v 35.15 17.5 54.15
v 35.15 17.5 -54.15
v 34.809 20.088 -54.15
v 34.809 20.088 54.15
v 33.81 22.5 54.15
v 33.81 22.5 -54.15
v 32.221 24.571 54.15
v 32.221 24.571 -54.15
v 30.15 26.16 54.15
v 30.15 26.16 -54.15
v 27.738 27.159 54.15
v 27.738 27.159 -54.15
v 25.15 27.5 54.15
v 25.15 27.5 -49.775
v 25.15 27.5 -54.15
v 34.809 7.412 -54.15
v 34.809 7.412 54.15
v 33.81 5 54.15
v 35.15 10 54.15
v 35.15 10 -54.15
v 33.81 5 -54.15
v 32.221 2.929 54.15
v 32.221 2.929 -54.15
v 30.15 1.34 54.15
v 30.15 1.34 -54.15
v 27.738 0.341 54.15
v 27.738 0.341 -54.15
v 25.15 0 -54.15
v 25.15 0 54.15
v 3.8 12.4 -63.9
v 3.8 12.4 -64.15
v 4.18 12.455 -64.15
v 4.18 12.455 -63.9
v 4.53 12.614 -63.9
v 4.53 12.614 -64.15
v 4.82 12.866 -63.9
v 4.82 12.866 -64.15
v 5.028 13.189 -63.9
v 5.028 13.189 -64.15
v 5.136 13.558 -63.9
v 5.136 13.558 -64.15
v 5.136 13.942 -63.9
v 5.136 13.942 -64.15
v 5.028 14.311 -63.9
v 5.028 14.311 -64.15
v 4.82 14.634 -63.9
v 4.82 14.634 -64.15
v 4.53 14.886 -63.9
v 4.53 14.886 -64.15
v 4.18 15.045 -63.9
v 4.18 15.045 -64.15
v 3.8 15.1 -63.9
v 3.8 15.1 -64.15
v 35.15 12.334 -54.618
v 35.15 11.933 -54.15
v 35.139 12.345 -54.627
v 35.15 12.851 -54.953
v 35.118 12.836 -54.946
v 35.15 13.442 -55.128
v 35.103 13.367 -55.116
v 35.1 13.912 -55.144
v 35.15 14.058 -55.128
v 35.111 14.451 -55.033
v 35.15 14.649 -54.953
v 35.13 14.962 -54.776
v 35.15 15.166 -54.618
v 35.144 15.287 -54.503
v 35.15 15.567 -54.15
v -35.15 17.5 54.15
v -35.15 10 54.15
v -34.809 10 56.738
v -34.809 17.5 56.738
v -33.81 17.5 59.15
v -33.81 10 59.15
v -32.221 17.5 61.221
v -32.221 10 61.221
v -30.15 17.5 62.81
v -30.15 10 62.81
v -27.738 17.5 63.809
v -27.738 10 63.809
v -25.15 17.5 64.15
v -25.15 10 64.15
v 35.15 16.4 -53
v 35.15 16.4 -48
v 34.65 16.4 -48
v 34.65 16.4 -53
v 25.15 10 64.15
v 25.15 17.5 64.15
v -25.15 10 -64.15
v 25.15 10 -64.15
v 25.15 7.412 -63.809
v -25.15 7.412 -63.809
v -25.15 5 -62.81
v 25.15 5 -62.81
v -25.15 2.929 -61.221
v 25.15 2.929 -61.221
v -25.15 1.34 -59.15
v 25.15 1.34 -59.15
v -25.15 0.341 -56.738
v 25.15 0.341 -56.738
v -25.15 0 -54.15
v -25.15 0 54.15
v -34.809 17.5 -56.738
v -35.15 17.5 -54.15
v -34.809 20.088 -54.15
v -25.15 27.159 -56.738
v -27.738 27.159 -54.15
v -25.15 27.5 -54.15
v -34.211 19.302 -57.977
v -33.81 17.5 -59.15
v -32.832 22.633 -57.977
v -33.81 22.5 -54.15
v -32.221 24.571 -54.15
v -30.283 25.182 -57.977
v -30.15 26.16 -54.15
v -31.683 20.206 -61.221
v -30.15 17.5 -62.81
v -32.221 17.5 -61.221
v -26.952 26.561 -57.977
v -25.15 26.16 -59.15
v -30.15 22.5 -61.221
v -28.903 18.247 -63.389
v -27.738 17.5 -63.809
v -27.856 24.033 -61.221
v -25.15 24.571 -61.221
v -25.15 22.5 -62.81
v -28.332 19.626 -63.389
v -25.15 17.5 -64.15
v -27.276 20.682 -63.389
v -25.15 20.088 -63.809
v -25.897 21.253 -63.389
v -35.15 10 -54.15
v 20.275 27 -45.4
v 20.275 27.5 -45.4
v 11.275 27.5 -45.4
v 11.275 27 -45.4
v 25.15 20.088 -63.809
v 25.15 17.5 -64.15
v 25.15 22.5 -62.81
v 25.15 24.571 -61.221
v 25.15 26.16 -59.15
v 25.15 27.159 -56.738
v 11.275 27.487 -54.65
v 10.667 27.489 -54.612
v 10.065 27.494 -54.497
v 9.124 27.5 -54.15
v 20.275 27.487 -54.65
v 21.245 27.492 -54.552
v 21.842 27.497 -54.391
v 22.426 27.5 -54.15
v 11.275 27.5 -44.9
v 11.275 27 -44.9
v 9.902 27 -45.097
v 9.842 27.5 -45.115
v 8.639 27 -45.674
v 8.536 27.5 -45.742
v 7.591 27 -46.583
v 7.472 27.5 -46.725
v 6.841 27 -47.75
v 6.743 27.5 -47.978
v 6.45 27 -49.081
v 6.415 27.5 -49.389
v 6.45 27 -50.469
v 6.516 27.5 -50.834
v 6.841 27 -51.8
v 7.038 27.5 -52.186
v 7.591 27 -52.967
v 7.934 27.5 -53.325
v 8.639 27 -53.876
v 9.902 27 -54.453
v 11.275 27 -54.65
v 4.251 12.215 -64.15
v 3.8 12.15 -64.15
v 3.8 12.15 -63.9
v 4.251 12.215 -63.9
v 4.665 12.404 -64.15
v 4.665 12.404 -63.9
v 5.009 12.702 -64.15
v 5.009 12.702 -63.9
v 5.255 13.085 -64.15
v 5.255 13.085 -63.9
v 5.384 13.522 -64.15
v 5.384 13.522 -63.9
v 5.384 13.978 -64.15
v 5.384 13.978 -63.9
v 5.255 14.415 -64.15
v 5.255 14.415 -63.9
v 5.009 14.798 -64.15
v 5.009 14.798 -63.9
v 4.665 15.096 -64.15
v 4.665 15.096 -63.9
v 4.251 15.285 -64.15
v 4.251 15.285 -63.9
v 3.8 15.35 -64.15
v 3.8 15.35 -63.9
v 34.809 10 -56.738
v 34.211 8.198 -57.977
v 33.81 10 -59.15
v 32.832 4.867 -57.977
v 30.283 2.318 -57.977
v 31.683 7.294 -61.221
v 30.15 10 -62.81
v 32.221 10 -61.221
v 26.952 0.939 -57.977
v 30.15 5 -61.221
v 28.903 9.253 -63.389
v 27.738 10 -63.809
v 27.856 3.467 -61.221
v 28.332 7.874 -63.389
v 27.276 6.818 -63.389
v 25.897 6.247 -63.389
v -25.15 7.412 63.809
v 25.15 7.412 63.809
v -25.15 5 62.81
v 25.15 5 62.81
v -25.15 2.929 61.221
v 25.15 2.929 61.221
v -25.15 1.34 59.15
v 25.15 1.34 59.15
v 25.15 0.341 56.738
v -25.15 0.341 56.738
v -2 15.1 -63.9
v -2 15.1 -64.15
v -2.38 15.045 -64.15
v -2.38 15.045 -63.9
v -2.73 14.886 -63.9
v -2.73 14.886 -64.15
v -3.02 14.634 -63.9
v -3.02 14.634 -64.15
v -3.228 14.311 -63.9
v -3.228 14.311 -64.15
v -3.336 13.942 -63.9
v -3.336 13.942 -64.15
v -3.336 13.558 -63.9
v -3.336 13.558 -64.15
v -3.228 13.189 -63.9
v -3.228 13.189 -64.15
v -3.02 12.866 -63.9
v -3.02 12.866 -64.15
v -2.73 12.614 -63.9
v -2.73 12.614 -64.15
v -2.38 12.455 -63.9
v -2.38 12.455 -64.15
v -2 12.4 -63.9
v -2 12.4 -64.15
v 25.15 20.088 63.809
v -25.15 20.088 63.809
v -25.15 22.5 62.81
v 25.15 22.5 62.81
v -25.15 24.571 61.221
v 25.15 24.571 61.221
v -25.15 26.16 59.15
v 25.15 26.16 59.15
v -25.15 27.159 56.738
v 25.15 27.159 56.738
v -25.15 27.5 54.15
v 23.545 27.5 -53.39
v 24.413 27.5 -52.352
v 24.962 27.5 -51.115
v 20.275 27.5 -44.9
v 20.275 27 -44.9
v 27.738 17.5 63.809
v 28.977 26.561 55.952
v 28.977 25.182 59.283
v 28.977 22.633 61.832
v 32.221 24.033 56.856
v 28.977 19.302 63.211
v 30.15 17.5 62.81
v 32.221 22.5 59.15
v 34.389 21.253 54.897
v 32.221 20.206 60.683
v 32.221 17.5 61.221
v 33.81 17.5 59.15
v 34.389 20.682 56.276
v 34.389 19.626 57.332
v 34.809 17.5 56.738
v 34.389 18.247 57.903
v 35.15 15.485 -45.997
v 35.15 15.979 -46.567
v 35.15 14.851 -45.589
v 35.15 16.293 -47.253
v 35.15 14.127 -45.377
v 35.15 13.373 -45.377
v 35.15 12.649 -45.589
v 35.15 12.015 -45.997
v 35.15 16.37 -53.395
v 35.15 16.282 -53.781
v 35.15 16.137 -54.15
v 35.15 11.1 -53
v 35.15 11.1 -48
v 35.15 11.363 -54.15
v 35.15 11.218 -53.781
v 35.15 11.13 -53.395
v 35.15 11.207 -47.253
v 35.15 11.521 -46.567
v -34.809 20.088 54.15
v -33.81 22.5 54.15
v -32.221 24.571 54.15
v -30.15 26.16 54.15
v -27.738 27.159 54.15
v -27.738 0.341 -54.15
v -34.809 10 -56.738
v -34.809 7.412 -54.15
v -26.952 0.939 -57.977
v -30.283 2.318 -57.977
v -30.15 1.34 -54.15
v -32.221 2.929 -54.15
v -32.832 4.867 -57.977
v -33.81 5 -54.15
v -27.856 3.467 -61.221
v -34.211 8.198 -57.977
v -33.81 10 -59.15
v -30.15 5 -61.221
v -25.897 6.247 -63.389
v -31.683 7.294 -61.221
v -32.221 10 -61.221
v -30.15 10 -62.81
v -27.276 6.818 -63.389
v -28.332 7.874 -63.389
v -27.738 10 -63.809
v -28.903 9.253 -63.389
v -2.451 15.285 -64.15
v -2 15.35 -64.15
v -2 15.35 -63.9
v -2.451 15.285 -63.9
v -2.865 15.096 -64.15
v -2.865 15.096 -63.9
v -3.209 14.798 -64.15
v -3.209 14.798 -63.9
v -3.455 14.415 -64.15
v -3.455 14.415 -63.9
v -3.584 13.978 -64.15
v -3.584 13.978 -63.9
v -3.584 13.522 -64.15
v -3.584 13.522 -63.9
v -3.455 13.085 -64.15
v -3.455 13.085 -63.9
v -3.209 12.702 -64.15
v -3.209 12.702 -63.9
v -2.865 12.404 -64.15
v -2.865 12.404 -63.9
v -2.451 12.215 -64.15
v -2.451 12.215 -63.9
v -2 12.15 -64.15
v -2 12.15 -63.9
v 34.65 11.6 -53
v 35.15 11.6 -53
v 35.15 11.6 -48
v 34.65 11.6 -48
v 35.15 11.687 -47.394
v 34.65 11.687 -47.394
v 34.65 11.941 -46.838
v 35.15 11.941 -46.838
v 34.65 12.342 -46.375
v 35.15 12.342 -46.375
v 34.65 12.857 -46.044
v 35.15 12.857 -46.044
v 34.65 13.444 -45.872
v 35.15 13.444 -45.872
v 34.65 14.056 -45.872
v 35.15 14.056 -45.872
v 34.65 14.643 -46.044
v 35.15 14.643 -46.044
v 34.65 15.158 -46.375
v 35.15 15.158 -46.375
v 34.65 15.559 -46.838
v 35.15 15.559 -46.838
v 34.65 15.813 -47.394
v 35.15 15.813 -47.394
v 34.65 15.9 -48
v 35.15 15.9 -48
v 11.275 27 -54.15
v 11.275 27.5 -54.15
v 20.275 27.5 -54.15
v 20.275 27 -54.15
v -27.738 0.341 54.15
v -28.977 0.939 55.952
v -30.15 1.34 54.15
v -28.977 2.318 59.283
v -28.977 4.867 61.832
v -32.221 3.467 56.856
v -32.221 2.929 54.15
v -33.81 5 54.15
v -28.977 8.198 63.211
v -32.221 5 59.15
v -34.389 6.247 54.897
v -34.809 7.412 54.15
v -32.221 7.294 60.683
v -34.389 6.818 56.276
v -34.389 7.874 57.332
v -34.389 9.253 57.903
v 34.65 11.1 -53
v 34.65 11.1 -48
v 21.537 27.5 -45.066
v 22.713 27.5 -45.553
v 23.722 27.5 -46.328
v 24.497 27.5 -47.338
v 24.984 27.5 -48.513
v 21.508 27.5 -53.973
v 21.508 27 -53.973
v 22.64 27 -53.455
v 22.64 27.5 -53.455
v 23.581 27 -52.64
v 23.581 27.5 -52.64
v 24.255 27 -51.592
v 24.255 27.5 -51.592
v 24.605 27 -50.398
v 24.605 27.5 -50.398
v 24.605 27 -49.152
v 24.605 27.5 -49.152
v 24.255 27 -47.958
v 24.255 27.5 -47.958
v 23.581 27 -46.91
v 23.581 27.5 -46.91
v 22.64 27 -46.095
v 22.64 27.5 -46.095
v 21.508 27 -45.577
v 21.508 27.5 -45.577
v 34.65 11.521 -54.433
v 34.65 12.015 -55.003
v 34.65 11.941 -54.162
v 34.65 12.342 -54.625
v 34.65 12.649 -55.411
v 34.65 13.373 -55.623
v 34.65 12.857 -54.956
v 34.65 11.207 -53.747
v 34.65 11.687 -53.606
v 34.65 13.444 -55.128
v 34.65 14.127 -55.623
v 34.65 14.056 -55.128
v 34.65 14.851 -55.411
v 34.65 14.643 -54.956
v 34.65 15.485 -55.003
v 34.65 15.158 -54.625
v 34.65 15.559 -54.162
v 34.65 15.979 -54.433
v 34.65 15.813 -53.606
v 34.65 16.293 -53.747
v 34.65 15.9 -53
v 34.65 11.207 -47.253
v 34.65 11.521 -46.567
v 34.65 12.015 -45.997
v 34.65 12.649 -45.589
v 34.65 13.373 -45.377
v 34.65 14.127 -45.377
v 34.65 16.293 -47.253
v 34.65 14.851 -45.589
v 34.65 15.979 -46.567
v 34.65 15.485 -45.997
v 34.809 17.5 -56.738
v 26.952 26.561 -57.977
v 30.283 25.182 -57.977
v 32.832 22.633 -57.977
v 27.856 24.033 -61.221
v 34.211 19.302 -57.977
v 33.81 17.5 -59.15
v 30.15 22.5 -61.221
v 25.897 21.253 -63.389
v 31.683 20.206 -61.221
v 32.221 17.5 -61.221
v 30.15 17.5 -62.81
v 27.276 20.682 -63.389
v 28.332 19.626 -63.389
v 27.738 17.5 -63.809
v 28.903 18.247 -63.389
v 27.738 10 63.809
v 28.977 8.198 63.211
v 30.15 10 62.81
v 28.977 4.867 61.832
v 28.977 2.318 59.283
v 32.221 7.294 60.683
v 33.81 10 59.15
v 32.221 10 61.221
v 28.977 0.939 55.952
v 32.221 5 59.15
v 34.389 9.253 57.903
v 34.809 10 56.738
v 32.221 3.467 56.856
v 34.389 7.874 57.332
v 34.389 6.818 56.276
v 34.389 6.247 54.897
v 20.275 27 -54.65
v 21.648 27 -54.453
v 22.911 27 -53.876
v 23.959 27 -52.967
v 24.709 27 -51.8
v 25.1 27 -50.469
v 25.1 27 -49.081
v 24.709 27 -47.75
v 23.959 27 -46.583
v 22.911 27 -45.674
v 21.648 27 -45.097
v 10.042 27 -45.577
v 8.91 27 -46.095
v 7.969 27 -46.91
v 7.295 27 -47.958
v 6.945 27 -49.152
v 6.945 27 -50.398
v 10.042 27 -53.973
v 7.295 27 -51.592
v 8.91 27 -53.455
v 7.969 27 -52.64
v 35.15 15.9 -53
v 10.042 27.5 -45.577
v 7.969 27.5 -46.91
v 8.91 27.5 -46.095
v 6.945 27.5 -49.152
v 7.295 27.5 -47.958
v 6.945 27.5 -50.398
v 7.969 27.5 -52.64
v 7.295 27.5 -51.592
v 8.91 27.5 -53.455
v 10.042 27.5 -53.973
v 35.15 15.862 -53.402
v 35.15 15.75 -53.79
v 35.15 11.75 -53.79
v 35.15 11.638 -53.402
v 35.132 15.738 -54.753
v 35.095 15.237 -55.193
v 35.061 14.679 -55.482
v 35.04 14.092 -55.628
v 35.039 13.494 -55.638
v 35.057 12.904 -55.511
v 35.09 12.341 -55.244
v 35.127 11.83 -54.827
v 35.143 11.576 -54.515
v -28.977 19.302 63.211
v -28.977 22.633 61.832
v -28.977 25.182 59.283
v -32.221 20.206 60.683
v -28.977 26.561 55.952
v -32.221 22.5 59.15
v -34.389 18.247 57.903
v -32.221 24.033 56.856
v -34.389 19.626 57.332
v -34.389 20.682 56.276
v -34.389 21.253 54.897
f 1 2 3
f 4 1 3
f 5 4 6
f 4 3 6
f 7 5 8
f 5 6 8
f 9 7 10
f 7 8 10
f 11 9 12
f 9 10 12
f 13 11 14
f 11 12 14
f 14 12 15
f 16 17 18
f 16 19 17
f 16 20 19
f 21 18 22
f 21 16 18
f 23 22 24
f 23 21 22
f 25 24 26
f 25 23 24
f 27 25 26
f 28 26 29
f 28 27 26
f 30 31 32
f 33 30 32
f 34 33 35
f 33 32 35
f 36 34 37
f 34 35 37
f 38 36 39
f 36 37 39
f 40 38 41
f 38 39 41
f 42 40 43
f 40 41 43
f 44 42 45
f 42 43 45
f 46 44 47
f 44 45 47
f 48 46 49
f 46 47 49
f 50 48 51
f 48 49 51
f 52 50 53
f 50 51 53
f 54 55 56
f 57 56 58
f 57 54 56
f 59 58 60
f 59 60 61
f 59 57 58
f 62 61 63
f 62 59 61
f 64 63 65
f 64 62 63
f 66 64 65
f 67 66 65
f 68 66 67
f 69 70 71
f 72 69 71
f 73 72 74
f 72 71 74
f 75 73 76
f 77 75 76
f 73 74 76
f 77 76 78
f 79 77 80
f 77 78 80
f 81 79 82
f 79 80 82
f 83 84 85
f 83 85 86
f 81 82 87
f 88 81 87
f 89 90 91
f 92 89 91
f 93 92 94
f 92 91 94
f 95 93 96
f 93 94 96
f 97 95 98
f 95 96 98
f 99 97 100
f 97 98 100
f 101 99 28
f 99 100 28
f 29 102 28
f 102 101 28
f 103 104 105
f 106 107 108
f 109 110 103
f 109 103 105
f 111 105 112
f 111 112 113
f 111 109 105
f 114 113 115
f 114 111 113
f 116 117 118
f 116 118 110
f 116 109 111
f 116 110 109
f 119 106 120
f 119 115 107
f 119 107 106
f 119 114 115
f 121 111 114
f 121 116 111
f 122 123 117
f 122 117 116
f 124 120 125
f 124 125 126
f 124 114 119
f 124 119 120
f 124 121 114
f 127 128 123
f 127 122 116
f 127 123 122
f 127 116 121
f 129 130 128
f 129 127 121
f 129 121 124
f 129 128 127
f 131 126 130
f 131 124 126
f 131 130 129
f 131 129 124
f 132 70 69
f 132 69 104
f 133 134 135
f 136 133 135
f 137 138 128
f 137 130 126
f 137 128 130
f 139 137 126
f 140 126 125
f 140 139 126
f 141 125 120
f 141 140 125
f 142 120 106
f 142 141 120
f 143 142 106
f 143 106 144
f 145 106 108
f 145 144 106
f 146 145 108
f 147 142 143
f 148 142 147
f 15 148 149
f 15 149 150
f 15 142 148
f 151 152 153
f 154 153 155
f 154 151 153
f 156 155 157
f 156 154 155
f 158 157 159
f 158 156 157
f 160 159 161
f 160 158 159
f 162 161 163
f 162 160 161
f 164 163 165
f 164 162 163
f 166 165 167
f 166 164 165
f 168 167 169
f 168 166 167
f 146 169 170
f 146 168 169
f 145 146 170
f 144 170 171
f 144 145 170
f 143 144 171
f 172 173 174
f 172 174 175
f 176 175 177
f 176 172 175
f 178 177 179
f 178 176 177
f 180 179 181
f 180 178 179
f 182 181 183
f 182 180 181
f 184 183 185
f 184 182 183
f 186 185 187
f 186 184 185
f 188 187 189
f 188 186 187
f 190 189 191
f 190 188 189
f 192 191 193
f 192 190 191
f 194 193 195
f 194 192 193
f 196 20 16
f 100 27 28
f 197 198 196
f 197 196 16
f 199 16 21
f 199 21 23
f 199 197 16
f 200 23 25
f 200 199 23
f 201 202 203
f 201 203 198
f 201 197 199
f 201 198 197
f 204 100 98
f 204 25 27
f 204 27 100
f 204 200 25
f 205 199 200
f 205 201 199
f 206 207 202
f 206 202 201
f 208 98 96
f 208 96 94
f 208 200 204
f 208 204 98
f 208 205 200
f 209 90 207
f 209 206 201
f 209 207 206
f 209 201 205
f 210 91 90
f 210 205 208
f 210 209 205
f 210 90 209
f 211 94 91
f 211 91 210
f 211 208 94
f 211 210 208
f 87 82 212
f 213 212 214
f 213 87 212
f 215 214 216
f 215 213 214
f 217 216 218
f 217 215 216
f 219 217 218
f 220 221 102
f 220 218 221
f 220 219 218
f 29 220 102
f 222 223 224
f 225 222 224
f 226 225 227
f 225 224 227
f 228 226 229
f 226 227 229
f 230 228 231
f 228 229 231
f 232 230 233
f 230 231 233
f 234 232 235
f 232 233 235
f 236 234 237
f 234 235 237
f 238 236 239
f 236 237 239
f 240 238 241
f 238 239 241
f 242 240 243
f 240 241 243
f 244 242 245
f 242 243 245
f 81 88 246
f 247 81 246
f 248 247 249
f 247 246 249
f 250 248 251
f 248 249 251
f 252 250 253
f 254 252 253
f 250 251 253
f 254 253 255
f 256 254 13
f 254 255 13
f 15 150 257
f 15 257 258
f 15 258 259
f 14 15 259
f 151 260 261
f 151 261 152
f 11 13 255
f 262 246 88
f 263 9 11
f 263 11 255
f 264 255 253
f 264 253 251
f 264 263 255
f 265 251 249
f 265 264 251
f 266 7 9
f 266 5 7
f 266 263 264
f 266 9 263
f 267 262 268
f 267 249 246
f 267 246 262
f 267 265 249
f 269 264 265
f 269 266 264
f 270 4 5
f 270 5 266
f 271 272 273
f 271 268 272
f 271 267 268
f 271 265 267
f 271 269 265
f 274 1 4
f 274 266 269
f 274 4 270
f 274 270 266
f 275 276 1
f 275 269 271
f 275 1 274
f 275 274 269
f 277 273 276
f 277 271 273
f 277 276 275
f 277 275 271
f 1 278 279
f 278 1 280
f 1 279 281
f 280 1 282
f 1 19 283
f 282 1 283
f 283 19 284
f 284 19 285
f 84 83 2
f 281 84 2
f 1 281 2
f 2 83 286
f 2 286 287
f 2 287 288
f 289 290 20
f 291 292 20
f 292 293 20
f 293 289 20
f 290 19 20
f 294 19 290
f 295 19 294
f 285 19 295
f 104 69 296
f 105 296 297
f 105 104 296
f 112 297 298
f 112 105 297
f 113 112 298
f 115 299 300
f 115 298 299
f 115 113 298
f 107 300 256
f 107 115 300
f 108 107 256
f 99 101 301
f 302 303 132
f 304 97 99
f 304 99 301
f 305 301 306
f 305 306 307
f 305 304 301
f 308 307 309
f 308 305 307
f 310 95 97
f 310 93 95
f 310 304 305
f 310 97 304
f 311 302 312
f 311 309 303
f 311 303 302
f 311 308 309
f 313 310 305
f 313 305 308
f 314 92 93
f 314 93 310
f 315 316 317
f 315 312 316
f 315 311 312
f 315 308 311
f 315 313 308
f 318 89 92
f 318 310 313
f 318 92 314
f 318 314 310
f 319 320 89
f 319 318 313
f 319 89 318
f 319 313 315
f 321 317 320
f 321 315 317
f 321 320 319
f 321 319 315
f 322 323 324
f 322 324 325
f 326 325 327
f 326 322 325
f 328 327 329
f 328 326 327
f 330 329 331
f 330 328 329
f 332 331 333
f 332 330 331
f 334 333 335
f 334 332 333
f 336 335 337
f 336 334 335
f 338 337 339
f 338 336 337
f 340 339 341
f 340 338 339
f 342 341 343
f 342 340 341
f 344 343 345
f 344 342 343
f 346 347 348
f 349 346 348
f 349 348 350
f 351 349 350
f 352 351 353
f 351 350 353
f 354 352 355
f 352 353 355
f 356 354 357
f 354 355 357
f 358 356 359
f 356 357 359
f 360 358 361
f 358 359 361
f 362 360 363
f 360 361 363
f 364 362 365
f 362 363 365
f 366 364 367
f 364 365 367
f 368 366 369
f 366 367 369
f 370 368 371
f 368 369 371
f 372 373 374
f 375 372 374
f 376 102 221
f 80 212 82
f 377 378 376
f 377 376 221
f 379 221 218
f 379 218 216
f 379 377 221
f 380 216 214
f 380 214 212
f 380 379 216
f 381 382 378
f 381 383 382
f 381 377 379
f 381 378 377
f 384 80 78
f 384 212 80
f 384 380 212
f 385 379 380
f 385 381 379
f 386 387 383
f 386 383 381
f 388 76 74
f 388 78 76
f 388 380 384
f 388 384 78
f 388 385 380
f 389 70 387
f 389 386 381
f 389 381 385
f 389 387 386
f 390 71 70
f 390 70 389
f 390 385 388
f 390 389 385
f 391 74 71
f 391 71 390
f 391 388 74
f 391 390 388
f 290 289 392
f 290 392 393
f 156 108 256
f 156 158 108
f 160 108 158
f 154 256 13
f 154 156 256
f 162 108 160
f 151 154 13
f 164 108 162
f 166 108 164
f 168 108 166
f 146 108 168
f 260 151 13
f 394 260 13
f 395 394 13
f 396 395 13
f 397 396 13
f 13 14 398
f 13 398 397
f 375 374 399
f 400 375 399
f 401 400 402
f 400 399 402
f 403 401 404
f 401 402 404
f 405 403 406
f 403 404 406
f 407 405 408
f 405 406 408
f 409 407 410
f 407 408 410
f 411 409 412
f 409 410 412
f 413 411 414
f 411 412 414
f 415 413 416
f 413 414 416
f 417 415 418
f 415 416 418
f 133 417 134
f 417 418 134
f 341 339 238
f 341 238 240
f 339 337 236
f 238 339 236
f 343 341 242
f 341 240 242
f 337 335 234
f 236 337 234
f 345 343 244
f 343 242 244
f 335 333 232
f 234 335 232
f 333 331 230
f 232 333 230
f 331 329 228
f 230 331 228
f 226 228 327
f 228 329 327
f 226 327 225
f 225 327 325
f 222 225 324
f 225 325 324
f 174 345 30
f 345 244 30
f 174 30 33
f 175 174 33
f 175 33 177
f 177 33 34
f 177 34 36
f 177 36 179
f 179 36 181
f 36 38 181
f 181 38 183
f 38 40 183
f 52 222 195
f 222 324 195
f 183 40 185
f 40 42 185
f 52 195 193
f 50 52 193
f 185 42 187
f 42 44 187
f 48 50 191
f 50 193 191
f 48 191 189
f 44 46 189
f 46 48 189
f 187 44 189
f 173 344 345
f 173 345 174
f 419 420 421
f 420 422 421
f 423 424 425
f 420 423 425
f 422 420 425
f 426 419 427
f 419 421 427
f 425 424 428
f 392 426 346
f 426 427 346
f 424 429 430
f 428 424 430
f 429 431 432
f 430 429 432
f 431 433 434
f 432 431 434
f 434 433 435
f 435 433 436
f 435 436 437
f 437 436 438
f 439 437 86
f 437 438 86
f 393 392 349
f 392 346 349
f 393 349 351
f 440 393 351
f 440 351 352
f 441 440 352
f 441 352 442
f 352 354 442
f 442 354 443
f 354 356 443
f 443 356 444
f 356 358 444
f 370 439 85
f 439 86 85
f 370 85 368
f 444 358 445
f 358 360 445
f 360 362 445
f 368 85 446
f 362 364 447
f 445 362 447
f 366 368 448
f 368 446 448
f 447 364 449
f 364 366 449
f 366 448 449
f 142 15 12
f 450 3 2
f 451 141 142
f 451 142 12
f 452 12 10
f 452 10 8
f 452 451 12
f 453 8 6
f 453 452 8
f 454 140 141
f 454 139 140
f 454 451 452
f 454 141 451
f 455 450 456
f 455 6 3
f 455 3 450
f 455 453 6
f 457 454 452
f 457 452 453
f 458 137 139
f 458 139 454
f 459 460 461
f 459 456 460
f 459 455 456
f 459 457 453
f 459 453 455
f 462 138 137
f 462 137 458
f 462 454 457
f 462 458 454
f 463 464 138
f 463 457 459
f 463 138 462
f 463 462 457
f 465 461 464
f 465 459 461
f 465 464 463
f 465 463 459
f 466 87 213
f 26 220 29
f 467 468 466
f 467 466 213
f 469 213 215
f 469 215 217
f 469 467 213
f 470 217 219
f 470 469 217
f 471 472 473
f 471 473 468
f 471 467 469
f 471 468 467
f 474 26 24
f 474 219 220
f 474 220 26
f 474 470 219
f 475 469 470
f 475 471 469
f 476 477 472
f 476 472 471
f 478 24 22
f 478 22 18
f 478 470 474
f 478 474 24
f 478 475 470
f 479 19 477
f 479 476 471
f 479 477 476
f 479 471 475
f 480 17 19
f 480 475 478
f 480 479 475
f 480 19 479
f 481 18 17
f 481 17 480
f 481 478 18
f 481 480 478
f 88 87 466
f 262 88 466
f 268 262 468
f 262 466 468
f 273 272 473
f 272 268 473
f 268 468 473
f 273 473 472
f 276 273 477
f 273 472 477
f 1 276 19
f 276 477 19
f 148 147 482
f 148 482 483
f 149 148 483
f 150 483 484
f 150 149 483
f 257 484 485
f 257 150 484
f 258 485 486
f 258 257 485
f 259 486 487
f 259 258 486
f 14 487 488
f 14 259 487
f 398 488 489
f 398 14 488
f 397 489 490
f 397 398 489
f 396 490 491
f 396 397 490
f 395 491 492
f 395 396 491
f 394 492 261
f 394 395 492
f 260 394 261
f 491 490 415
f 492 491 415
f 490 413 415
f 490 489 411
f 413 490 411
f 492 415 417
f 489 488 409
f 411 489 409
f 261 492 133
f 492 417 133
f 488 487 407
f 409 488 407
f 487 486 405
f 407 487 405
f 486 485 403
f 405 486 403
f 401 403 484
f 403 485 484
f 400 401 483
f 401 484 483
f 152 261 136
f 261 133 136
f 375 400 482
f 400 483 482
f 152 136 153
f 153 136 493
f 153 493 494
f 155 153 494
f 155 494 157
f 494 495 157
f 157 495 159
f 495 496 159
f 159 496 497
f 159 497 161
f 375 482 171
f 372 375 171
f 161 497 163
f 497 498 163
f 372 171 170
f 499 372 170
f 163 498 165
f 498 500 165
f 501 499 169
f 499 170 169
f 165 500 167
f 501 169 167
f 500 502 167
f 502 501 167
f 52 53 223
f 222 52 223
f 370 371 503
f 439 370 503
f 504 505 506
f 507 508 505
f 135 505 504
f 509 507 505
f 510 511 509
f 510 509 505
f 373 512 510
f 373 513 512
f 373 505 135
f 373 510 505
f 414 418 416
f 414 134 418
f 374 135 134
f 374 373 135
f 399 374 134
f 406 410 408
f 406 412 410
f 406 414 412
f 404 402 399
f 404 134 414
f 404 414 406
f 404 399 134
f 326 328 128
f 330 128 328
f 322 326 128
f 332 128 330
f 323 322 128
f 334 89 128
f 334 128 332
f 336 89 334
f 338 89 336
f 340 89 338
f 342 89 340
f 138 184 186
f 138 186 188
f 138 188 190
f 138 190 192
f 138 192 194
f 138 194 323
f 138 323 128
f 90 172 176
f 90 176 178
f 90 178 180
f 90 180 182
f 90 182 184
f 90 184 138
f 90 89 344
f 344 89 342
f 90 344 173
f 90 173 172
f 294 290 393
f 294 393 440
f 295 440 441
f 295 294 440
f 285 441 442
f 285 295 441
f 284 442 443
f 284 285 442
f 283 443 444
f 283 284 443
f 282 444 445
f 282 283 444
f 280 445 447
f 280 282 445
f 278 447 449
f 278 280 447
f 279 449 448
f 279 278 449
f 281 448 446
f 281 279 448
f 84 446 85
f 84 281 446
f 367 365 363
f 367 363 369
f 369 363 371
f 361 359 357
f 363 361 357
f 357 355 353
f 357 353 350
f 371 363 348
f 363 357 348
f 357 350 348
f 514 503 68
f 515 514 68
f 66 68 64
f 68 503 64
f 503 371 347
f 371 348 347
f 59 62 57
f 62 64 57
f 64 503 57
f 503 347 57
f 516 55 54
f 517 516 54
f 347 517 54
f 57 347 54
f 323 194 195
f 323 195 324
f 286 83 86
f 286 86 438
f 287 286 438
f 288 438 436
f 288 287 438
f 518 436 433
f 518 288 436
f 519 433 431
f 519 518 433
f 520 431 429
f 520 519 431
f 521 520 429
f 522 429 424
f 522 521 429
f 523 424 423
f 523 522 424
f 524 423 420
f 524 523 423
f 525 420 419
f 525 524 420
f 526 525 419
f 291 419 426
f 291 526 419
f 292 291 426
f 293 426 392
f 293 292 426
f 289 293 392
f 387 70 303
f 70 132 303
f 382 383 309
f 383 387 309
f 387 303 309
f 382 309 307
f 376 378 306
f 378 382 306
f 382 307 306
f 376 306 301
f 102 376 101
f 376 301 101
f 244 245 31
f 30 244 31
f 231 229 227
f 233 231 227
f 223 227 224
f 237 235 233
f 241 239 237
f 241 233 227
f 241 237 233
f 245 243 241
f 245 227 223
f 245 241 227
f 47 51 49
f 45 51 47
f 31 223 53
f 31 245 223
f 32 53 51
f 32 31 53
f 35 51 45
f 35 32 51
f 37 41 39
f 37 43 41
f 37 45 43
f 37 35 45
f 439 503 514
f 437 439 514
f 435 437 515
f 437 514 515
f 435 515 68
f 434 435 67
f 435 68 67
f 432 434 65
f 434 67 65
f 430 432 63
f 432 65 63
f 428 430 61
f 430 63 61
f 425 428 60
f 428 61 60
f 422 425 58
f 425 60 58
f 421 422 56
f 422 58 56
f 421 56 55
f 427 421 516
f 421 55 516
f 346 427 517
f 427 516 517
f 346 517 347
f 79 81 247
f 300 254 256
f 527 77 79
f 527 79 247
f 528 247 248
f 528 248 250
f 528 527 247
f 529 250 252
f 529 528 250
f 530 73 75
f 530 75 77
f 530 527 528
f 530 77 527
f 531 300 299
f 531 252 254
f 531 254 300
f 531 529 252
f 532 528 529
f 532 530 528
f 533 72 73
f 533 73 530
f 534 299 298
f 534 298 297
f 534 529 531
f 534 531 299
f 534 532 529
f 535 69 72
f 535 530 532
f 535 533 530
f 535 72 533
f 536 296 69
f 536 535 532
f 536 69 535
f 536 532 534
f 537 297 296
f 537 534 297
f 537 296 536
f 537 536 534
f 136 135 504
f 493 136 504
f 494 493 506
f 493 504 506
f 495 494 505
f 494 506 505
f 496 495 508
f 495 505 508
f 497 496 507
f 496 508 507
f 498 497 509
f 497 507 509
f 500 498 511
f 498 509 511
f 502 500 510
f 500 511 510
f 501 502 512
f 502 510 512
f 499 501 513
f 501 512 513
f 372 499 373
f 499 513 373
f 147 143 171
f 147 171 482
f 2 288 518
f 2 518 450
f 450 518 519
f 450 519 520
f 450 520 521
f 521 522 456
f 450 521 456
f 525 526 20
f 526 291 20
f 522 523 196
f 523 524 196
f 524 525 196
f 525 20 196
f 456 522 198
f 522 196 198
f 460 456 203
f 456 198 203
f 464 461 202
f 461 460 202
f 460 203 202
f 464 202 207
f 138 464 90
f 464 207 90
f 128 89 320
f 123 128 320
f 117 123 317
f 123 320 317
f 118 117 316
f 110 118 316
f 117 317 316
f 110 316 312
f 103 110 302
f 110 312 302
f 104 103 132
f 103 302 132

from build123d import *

# Parameters (mm, degrees)
SKETCH1_W           = 70.3
SKETCH1_H           = 128.3
BOSS_EXTRUDE1_DEPTH = 27.5
FILLET1_R           = 10
CUT_EXTRUDE1_START  = 35.15
CUT_EXTRUDE1_DEPTH  = 0.5
CUT_EXTRUDE2_DEPTH  = 0.5
FILLET2_R           = 10
CUT_EXTRUDE3_DEPTH  = 0.25


with BuildPart() as part:
    # Sketch1 → Boss-Extrude1 (new body)
    with BuildSketch(Plane(origin=(0, 0, 0), x_dir=(1, 0, 0), z_dir=(0, 1, 0))):
        Rectangle(SKETCH1_W, SKETCH1_H)
    extrude(amount=BOSS_EXTRUDE1_DEPTH)

    # Fillet1
    fillet1_edges = [part.edges().sort_by_distance(p)[0] for p in [
        (-35.15, 27.5, 0),
        (0, 27.5, 64.15),
        (35.15, 27.5, 0),
        (0, 0, 64.15),
        (-35.15, 0, 0),
        (0, 0, -64.15),
        (35.15, 0, 0),
        (0, 27.5, -64.15),
    ]]
    fillet(fillet1_edges, radius=FILLET1_R)

    # Sketch2 → Cut-Extrude1 (cut)
    with BuildSketch(Plane(origin=(0, 0, 0), x_dir=(0, 0, -1), z_dir=(1, 0, 0)).offset(CUT_EXTRUDE1_START)):
        with BuildLine():
            Line((48, 16.4), (53, 16.4))
            ThreePointArc((53, 16.4), (55.65, 13.75), (53, 11.1))
            Line((53, 11.1), (48, 11.1))
            ThreePointArc((48, 11.1), (45.35, 13.75), (48, 16.4))
        make_face()
        with BuildLine():
            Line((48, 15.9), (53, 15.9))
            ThreePointArc((53, 15.9), (55.15, 13.75), (53, 11.6))
            Line((53, 11.6), (48, 11.6))
            ThreePointArc((48, 11.6), (45.85, 13.75), (48, 15.9))
        make_face(mode=Mode.SUBTRACT)
    extrude(amount=-CUT_EXTRUDE1_DEPTH, mode=Mode.SUBTRACT)

    # Sketch3 → Cut-Extrude2 (cut)
    with BuildSketch(Plane(origin=(0, 27.5, 0), x_dir=(1, 0, 0), z_dir=(0, 1, 0))):
        with BuildLine():
            Line((11.275, 54.65), (20.275, 54.65))
            ThreePointArc((20.275, 54.65), (25.15, 49.775), (20.275, 44.9))
            Line((20.275, 44.9), (11.275, 44.9))
            ThreePointArc((11.275, 44.9), (6.4, 49.775), (11.275, 54.65))
        make_face()
        with BuildLine():
            Line((11.275, 54.15), (20.275, 54.15))
            ThreePointArc((20.275, 54.15), (24.65, 49.775), (20.275, 45.4))
            Line((20.275, 45.4), (11.275, 45.4))
            ThreePointArc((11.275, 45.4), (6.9, 49.775), (11.275, 54.15))
        make_face(mode=Mode.SUBTRACT)
    extrude(amount=-CUT_EXTRUDE2_DEPTH, mode=Mode.SUBTRACT)

    # Fillet2
    # the kernel refuses this fillet: 10 mm, written as the material it takes off along each edge
    with BuildSketch(Plane(origin=(25.15, 10, 54.15), x_dir=(0, 0, 1), z_dir=(1, 0, 0))) as fillet2_piece_1_section:
        Polygon((0, 0), (FILLET2_R * 1.02, 0), (FILLET2_R * 1.02, FILLET2_R * 1.02), (0, FILLET2_R * 1.02), align=None)
    fillet2_piece_1 = extrude(amount=FILLET2_R * 1.02, mode=Mode.PRIVATE)
    fillet2_piece_1 = fillet2_piece_1 - Plane(origin=(25.15, 10, 54.15), x_dir=(0, 0.7071067811865475, -0.7071067811865475), z_dir=(1, 0, 0)) * Sphere(FILLET2_R, mode=Mode.PRIVATE)
    add(fillet2_piece_1, mode=Mode.SUBTRACT)
    with BuildSketch(Plane(origin=(-25.15, 10, 54.15), x_dir=(0, 0, 1), z_dir=(-1, 0, 0))) as fillet2_piece_2_section:
        Polygon((0, 0), (FILLET2_R * 1.02, 0), (FILLET2_R * 1.02, -FILLET2_R * 1.02), (0, -FILLET2_R * 1.02), align=None)
    fillet2_piece_2 = extrude(amount=FILLET2_R * 1.02, mode=Mode.PRIVATE)
    fillet2_piece_2 = fillet2_piece_2 - Plane(origin=(-25.15, 10, 54.15), x_dir=(0, 0.7071067811865475, -0.7071067811865475), z_dir=(-1, 0, 0)) * Sphere(FILLET2_R, mode=Mode.PRIVATE)
    add(fillet2_piece_2, mode=Mode.SUBTRACT)
    with BuildSketch(Plane(origin=(25.15, 10, -54.15), x_dir=(1, 0, 0), z_dir=(0, 0, -1))) as fillet2_piece_3_section:
        Polygon((0, 0), (FILLET2_R * 1.02, 0), (FILLET2_R * 1.02, FILLET2_R * 1.02), (0, FILLET2_R * 1.02), align=None)
    fillet2_piece_3 = extrude(amount=FILLET2_R * 1.02, mode=Mode.PRIVATE)
    fillet2_piece_3 = fillet2_piece_3 - Plane(origin=(25.15, 10, -54.15), x_dir=(-0.7071067811865475, 0.7071067811865475, 0), z_dir=(0, 0, -1)) * Sphere(FILLET2_R, mode=Mode.PRIVATE)
    add(fillet2_piece_3, mode=Mode.SUBTRACT)
    with BuildSketch(Plane(origin=(-25.15, 10, -54.15), x_dir=(-1, 0, 0), z_dir=(0, 0, -1))) as fillet2_piece_4_section:
        Polygon((0, 0), (FILLET2_R * 1.02, 0), (FILLET2_R * 1.02, -FILLET2_R * 1.02), (0, -FILLET2_R * 1.02), align=None)
    fillet2_piece_4 = extrude(amount=FILLET2_R * 1.02, mode=Mode.PRIVATE)
    fillet2_piece_4 = fillet2_piece_4 - Plane(origin=(-25.15, 10, -54.15), x_dir=(0.7071067811865475, 0.7071067811865475, 0), z_dir=(0, 0, -1)) * Sphere(FILLET2_R, mode=Mode.PRIVATE)
    add(fillet2_piece_4, mode=Mode.SUBTRACT)
    with BuildSketch(Plane(origin=(-25.15, 17.5, -54.15), x_dir=(-1, 0, 0), z_dir=(0, 0, -1))) as fillet2_piece_5_section:
        Polygon((0, 0), (FILLET2_R * 1.02, 0), (FILLET2_R * 1.02, FILLET2_R * 1.02), (0, FILLET2_R * 1.02), align=None)
    fillet2_piece_5 = extrude(amount=FILLET2_R * 1.02, mode=Mode.PRIVATE)
    fillet2_piece_5 = fillet2_piece_5 - Plane(origin=(-25.15, 17.5, -54.15), x_dir=(0.7071067811865475, -0.7071067811865475, 0), z_dir=(0, 0, -1)) * Sphere(FILLET2_R, mode=Mode.PRIVATE)
    add(fillet2_piece_5, mode=Mode.SUBTRACT)
    with BuildSketch(Plane(origin=(25.15, 17.5, -54.15), x_dir=(1, 0, 0), z_dir=(0, 0, -1))) as fillet2_piece_6_section:
        Polygon((0, 0), (FILLET2_R * 1.02, 0), (FILLET2_R * 1.02, -FILLET2_R * 1.02), (0, -FILLET2_R * 1.02), align=None)
    fillet2_piece_6 = extrude(amount=FILLET2_R * 1.02, mode=Mode.PRIVATE)
    fillet2_piece_6 = fillet2_piece_6 - Plane(origin=(25.15, 17.5, -54.15), x_dir=(-0.7071067811865475, -0.7071067811865475, 0), z_dir=(0, 0, -1)) * Sphere(FILLET2_R, mode=Mode.PRIVATE)
    add(fillet2_piece_6, mode=Mode.SUBTRACT)
    with BuildSketch(Plane(origin=(-25.15, 17.5, 54.15), x_dir=(0, 0, 1), z_dir=(-1, 0, 0))) as fillet2_piece_7_section:
        Polygon((0, 0), (FILLET2_R * 1.02, 0), (FILLET2_R * 1.02, FILLET2_R * 1.02), (0, FILLET2_R * 1.02), align=None)
    fillet2_piece_7 = extrude(amount=FILLET2_R * 1.02, mode=Mode.PRIVATE)
    fillet2_piece_7 = fillet2_piece_7 - Plane(origin=(-25.15, 17.5, 54.15), x_dir=(0, -0.7071067811865475, -0.7071067811865475), z_dir=(-1, 0, 0)) * Sphere(FILLET2_R, mode=Mode.PRIVATE)
    add(fillet2_piece_7, mode=Mode.SUBTRACT)
    with BuildSketch(Plane(origin=(25.15, 17.5, 54.15), x_dir=(0, 0, 1), z_dir=(1, 0, 0))) as fillet2_piece_8_section:
        Polygon((0, 0), (FILLET2_R * 1.02, 0), (FILLET2_R * 1.02, -FILLET2_R * 1.02), (0, -FILLET2_R * 1.02), align=None)
    fillet2_piece_8 = extrude(amount=FILLET2_R * 1.02, mode=Mode.PRIVATE)
    fillet2_piece_8 = fillet2_piece_8 - Plane(origin=(25.15, 17.5, 54.15), x_dir=(0, -0.7071067811865475, -0.7071067811865475), z_dir=(1, 0, 0)) * Sphere(FILLET2_R, mode=Mode.PRIVATE)
    add(fillet2_piece_8, mode=Mode.SUBTRACT)
    with BuildSketch(Plane(origin=(-35.15, 10, -64.15), x_dir=(1, 0, 0), z_dir=(0, 1, 0)), Plane(origin=(-35.15, 10, 64.15), x_dir=(0, 0, -1), z_dir=(0, 1, 0))) as fillet2_piece_9:
        with BuildLine():
            CenterArc((FILLET2_R, -FILLET2_R), FILLET2_R, 90, 90)
            Line((0, -FILLET2_R), (0, 0))
            Line((0, 0), (FILLET2_R, 0))
        make_face()
    extrude(amount=7.5, mode=Mode.SUBTRACT)
    with BuildSketch(Plane(origin=(35.15, 10, -64.15), x_dir=(-1, 0, 0), z_dir=(0, 1, 0))) as fillet2_piece_10_section:
        with BuildLine():
            CenterArc((FILLET2_R, FILLET2_R), FILLET2_R, 180, 90)
            Line((0, FILLET2_R), (0, 0))
            Line((0, 0), (FILLET2_R, 0))
        make_face()
    fillet2_piece_10 = extrude(amount=7.5, mode=Mode.PRIVATE)
    fillet2_piece_10 = fillet2_piece_10 - Plane(origin=(30.454991339, 13.75, -53), x_dir=(0, 1, 0), z_dir=(1, 0, 0)) * Cylinder(2.15, 55, mode=Mode.PRIVATE)
    add(fillet2_piece_10, mode=Mode.SUBTRACT)
    with BuildSketch(Plane(origin=(35.15, 10, 64.15), x_dir=(0, 0, -1), z_dir=(0, 1, 0))) as fillet2_piece_11:
        with BuildLine():
            CenterArc((FILLET2_R, FILLET2_R), FILLET2_R, 180, 90)
            Line((0, FILLET2_R), (0, 0))
            Line((0, 0), (FILLET2_R, 0))
        make_face()
    extrude(amount=7.5, mode=Mode.SUBTRACT)

    # Sketch4 → Cut-Extrude3 (cut)
    with BuildSketch(Plane(origin=(0, 0, -64.15), x_dir=(-1, 0, 0), z_dir=(0, 0, -1))):
        with BuildLine():
            Line((-3.8, 15.35), (2, 15.35))
            ThreePointArc((2, 15.35), (3.6, 13.75), (2, 12.15))
            Line((2, 12.15), (-3.8, 12.15))
            ThreePointArc((-3.8, 12.15), (-5.4, 13.75), (-3.8, 15.35))
        make_face()
        with BuildLine():
            Line((-3.8, 15.1), (2, 15.1))
            ThreePointArc((2, 15.1), (3.35, 13.75), (2, 12.4))
            Line((2, 12.4), (-3.8, 12.4))
            ThreePointArc((-3.8, 12.4), (-5.15, 13.75), (-3.8, 15.1))
        make_face(mode=Mode.SUBTRACT)
    extrude(amount=-CUT_EXTRUDE3_DEPTH, mode=Mode.SUBTRACT)


solid = part.part
